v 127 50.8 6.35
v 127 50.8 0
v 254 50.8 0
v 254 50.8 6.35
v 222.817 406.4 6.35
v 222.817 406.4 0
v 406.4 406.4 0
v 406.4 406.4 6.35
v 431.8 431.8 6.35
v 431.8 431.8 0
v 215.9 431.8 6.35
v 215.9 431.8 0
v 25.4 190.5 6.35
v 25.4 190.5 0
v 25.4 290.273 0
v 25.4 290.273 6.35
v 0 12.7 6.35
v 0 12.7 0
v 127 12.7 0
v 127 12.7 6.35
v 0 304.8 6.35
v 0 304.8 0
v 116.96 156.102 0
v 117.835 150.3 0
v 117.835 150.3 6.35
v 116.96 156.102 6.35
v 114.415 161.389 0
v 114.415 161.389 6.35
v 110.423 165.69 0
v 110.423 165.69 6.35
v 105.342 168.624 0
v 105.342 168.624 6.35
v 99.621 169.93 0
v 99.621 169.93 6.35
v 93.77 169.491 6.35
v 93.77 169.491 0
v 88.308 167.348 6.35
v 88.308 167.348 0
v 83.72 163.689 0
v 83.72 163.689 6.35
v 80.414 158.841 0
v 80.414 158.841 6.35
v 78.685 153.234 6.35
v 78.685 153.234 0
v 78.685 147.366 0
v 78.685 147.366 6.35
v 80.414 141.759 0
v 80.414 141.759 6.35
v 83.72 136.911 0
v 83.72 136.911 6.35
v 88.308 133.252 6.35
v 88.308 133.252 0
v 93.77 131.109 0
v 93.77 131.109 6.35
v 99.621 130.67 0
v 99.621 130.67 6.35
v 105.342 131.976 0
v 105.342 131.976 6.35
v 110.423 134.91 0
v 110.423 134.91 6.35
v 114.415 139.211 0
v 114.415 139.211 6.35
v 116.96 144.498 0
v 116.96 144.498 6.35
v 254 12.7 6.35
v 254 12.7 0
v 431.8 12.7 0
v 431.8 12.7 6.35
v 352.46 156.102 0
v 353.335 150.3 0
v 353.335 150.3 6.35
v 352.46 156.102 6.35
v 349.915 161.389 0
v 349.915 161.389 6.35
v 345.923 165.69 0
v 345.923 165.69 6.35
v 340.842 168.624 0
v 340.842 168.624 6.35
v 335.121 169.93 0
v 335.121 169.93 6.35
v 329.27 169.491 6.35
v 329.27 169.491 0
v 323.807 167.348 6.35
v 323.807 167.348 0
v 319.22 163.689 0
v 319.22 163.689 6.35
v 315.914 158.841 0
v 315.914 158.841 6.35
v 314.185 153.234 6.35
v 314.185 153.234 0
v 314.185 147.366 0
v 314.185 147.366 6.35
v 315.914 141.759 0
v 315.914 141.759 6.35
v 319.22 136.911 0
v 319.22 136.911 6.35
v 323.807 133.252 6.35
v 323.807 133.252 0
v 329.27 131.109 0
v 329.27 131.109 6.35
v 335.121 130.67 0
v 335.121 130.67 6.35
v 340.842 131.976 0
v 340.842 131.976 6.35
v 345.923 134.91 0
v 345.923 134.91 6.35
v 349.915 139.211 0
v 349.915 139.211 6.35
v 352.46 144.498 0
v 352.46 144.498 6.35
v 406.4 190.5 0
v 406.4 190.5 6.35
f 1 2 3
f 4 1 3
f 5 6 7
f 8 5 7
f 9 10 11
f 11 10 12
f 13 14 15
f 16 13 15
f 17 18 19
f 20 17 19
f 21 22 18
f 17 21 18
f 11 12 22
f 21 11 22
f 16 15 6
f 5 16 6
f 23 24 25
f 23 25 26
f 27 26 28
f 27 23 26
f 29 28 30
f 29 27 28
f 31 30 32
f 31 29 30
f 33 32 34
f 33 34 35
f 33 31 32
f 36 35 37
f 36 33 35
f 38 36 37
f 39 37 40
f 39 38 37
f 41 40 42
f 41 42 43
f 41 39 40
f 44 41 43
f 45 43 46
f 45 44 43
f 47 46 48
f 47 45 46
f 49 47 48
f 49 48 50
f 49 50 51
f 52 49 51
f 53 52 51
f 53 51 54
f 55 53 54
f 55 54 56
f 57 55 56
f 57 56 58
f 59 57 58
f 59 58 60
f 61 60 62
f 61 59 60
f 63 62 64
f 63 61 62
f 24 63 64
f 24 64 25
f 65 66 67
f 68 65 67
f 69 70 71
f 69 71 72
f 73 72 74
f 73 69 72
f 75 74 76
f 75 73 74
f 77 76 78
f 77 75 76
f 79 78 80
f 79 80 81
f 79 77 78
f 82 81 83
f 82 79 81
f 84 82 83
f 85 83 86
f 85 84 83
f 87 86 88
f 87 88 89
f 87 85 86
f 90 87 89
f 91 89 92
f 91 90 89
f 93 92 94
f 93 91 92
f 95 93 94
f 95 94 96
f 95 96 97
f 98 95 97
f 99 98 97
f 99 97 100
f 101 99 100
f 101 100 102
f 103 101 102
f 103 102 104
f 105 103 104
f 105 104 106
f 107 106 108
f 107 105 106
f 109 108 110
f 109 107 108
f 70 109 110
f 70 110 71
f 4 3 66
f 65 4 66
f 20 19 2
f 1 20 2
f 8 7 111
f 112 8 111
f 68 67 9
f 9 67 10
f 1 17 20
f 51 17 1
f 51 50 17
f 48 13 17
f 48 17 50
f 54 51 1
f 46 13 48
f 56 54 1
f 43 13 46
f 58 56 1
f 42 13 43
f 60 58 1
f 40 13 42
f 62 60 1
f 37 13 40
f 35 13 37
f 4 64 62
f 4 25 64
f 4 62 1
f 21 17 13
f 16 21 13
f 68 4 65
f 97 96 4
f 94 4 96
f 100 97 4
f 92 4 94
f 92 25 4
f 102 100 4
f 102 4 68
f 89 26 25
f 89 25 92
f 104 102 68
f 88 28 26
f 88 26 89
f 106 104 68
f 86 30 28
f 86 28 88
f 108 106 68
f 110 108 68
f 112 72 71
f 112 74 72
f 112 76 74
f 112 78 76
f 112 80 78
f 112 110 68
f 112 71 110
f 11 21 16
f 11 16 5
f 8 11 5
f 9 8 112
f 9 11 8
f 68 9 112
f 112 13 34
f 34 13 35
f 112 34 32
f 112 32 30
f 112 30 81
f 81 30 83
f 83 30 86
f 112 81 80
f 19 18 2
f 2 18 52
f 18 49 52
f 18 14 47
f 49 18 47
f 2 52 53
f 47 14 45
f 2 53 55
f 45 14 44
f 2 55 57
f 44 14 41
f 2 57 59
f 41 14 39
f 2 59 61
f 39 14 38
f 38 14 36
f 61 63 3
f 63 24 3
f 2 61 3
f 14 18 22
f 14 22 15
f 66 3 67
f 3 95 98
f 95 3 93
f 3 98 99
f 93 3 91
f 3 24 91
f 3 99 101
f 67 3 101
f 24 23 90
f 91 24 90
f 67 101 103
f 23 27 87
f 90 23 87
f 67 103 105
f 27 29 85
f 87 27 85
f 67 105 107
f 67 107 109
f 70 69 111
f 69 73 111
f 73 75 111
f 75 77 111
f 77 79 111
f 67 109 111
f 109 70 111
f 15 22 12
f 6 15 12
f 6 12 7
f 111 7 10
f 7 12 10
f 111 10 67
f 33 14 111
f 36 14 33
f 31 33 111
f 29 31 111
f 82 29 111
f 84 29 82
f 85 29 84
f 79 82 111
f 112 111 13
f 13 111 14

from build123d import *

# Parameters (mm, degrees)
FRAME_EXTERIOR_MASTER_OUTLINE_R = 19.685
FRAME_EXTERIOR_MASTER_DEPTH     = 6.35
CUT_EXTRUDE1_DEPTH              = 611.690430988


# Read off the part's stored shape, not the designer's step: Frame Exterior Master
with BuildPart() as part:
    # Frame Exterior Master outline → Frame Exterior Master (new body)
    with BuildSketch(Plane.XY):
        Polygon((431.8, 12.7), (431.8, 431.8), (215.9, 431.8), (0, 304.8), (0, 12.7), (127, 12.7), (127, 50.8), (254, 50.8), (254, 12.7), align=None)
        with Locations((98.15, 150.3)):
            Circle(FRAME_EXTERIOR_MASTER_OUTLINE_R, mode=Mode.SUBTRACT)
        with Locations((333.65, 150.3)):
            Circle(FRAME_EXTERIOR_MASTER_OUTLINE_R, mode=Mode.SUBTRACT)
    extrude(amount=FRAME_EXTERIOR_MASTER_DEPTH)

    # Sketch1 → Cut-Extrude1 (cut, through all)
    with BuildSketch(Plane(origin=(0, 0, 0), x_dir=(-1, 0, 0), z_dir=(0, 0, -1))):
        Polygon((-406.4, 406.4), (-406.4, 190.5), (-25.4, 190.5), (-25.4, 290.27257022), (-222.816630625, 406.4), align=None)
    extrude(amount=-CUT_EXTRUDE1_DEPTH, mode=Mode.SUBTRACT)


solid = part.part
